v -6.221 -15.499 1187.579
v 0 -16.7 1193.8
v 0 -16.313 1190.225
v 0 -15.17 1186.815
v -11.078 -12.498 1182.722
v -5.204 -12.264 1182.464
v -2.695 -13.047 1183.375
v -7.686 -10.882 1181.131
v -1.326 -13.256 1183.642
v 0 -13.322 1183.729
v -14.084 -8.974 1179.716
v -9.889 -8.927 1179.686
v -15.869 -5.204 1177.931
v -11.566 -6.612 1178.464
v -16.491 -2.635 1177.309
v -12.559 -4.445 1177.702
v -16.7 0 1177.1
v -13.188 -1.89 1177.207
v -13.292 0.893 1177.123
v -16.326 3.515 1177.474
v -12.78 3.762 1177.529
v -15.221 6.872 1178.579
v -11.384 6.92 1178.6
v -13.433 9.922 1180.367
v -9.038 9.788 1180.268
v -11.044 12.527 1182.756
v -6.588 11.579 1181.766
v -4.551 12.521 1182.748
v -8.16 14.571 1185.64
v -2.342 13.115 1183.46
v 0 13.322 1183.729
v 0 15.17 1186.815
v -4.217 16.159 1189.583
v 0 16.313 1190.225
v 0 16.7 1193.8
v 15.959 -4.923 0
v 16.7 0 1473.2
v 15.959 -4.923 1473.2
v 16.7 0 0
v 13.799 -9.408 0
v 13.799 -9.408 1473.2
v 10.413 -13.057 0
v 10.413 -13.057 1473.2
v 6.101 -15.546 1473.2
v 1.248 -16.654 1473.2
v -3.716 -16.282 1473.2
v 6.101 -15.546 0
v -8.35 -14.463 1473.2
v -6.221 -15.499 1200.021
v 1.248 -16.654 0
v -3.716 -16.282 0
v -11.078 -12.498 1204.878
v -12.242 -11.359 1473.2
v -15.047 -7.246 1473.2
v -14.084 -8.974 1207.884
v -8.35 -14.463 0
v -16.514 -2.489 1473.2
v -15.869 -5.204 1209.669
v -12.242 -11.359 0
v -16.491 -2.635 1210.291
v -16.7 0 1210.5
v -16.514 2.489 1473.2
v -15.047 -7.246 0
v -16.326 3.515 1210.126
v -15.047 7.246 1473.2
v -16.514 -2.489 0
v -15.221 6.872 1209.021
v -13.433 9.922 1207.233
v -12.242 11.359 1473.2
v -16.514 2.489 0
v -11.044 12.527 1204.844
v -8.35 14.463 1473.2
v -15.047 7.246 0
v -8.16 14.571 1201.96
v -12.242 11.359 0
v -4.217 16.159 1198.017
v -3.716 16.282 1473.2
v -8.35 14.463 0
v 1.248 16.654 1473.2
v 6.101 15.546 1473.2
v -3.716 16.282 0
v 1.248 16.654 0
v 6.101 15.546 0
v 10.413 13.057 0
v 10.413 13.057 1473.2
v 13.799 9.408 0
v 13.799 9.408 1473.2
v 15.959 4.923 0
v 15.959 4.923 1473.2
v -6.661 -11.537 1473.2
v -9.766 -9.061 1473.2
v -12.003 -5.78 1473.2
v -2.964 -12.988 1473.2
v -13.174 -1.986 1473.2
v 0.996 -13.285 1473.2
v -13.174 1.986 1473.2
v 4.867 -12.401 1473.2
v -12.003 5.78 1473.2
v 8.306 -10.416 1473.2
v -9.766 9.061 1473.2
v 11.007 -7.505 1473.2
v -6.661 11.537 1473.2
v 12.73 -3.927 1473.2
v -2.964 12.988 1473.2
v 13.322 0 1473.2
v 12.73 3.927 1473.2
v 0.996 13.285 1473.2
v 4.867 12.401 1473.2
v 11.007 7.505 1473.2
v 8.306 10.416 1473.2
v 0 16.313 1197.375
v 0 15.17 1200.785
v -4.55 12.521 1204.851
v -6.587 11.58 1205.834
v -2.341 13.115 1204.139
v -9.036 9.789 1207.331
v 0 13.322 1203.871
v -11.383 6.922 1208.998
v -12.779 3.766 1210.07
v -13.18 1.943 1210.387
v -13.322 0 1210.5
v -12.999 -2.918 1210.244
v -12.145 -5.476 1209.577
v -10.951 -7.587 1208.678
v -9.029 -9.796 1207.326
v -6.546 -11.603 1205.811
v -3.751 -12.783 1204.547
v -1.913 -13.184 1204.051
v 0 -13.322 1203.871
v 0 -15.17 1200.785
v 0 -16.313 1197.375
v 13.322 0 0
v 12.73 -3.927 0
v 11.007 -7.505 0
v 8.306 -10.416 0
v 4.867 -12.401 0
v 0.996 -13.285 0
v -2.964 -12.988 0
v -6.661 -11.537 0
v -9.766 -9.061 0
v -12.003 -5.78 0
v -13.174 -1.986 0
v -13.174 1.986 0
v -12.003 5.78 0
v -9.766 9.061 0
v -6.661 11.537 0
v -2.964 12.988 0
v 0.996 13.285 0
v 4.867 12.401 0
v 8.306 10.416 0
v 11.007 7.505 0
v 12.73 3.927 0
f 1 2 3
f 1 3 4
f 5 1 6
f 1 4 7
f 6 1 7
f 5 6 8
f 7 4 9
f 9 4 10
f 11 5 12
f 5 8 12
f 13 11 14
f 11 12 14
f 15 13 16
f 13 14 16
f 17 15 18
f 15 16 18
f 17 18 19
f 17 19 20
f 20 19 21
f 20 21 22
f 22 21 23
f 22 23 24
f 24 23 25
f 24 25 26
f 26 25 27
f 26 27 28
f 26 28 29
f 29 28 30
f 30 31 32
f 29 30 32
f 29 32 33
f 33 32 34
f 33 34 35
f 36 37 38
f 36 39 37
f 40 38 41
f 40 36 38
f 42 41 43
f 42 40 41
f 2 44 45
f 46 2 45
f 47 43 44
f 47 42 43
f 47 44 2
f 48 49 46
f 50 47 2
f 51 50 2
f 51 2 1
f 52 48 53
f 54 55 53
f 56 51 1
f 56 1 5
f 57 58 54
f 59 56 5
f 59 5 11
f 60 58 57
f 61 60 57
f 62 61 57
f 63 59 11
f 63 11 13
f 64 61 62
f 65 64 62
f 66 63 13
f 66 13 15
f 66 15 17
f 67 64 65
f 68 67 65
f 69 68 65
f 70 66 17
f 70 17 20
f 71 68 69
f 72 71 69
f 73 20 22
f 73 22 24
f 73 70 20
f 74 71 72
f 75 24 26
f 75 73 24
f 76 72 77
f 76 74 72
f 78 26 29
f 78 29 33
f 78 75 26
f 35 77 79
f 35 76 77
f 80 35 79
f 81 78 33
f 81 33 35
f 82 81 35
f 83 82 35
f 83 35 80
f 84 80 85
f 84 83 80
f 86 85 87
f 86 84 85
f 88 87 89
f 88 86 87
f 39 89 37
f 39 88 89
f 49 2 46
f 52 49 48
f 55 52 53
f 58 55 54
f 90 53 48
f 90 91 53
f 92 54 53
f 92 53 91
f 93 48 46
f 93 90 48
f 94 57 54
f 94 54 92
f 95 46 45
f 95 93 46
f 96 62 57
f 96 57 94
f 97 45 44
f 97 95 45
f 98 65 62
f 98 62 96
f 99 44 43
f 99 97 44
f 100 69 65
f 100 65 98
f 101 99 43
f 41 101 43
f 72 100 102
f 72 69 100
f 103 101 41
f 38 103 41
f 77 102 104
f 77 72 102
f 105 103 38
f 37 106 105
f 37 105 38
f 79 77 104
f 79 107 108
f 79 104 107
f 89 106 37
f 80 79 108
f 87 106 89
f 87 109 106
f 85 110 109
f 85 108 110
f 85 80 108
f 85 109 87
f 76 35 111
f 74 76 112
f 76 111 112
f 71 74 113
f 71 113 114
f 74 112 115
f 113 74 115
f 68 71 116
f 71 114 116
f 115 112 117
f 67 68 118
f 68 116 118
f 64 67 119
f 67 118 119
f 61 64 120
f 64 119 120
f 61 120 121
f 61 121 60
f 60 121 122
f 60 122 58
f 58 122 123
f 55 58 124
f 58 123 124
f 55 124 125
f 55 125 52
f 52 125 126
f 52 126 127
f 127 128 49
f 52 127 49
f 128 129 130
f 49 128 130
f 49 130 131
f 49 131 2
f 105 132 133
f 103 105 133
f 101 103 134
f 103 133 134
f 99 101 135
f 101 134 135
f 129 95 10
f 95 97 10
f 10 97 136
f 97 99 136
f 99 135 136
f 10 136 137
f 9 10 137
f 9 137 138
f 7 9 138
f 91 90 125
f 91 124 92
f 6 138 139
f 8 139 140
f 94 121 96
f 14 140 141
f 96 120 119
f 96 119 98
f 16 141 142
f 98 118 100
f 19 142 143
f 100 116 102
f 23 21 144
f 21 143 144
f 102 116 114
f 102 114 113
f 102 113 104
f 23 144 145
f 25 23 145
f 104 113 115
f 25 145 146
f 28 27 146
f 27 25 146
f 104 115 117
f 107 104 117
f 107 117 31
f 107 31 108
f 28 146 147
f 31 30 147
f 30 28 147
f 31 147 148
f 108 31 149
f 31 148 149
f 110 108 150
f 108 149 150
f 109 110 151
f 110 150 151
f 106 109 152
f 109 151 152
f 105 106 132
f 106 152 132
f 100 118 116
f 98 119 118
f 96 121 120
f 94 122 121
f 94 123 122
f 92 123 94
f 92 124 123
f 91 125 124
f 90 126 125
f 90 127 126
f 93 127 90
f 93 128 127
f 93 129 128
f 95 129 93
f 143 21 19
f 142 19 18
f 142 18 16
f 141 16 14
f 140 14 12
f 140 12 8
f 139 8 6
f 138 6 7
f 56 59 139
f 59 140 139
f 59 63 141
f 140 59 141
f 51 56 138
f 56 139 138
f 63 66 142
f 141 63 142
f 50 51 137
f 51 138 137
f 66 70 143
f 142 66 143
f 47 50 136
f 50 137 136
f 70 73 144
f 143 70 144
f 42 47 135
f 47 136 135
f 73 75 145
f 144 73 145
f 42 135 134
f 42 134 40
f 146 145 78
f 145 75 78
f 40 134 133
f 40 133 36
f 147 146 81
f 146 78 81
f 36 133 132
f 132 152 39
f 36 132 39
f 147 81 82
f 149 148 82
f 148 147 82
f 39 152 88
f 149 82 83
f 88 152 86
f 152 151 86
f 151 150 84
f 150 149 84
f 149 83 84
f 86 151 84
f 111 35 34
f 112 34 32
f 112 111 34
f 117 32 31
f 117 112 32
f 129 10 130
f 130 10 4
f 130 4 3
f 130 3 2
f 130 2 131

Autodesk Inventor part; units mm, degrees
ref_plane "Start plane" through (0, 0, 0) normal (0, 0, 1) x (1, 0, 0)
ref_plane "End plane" through (0, 0, 1473.2) normal (0, 0, 1) x (1, 0, 0)
sketch "Sketch" plane through (0, 0, 0) normal (0, 0, 1) x (1, 0, 0)
  circle A0 centre (0, 0) radius 13.3223
  circle A1 centre (0, 0) radius 16.7005
  dimension "d0" = 33.401
  dimension "d1" = 3.3782
extrude "Body" add sketch "Sketch" along normal up to surface (1473.2 mm away) from surface at 0
sketch "Sketch3" plane through (0, 0, 0) normal (0, 0, 1) x (1, 0, 0)
  line L0 (0, 0) -> (10, 0)
ref_plane "Work Plane3" through (0, 0, 0) normal (0, -1, 0) x (1, 0, 0)
sketch "Sketch4" plane through (0, 0, 0) normal (0, -1, 0) x (1, 0, 0)
  line L0 (-2, 0) -> (12, 0)
  line L1 (-2, 1473.2) -> (12, 1473.2)
  dimension "d7" = 1473.2
ref_plane "Work Plane4" through (0, 0, 1193.8) normal (-1, 0, 0) x (0, 0, 1)
ref_plane "Work Plane5" through (-2143.252, 0, 1193.8) normal (-1, 0, 0) x (0, 0, 1)
ref_plane "Work Plane6" through (-1071.626, 0, 1193.8) normal (-1, 0, 0) x (0, 0, 1)
sketch "Sketch5" plane through (-1071.626, 0, 1193.8) normal (-1, 0, 0) x (0, 0, 1)
  circle A0 centre (0, 0) radius 16.7005
  circle A1 centre (0, 0) radius 13.3223
extrude "Extrusion2" cut sketch "Sketch5" along normal up to surface (2143.252 mm away) from surface at -1071.626 contours A0 | A1
equation "\"d0\" = G_H"
equation "\"d1\" = G_T"
equation "\"d2\" = G_L"
equation "\"G_H\" = 33.401"
equation "\"G_T\" = 3.3782"
equation "\"G_L\" = d7"
equation "\"G_OFFSET_START\" = 0"
equation "\"G_OFFSET_END\" = 0"
equation "\"d5\" = G_OFFSET_END + B_L"
equation "\"B_L\" = 1473.2"
properties part number "ANSI - 1 x 0.133 - 58" material "Aluminum 6061"
